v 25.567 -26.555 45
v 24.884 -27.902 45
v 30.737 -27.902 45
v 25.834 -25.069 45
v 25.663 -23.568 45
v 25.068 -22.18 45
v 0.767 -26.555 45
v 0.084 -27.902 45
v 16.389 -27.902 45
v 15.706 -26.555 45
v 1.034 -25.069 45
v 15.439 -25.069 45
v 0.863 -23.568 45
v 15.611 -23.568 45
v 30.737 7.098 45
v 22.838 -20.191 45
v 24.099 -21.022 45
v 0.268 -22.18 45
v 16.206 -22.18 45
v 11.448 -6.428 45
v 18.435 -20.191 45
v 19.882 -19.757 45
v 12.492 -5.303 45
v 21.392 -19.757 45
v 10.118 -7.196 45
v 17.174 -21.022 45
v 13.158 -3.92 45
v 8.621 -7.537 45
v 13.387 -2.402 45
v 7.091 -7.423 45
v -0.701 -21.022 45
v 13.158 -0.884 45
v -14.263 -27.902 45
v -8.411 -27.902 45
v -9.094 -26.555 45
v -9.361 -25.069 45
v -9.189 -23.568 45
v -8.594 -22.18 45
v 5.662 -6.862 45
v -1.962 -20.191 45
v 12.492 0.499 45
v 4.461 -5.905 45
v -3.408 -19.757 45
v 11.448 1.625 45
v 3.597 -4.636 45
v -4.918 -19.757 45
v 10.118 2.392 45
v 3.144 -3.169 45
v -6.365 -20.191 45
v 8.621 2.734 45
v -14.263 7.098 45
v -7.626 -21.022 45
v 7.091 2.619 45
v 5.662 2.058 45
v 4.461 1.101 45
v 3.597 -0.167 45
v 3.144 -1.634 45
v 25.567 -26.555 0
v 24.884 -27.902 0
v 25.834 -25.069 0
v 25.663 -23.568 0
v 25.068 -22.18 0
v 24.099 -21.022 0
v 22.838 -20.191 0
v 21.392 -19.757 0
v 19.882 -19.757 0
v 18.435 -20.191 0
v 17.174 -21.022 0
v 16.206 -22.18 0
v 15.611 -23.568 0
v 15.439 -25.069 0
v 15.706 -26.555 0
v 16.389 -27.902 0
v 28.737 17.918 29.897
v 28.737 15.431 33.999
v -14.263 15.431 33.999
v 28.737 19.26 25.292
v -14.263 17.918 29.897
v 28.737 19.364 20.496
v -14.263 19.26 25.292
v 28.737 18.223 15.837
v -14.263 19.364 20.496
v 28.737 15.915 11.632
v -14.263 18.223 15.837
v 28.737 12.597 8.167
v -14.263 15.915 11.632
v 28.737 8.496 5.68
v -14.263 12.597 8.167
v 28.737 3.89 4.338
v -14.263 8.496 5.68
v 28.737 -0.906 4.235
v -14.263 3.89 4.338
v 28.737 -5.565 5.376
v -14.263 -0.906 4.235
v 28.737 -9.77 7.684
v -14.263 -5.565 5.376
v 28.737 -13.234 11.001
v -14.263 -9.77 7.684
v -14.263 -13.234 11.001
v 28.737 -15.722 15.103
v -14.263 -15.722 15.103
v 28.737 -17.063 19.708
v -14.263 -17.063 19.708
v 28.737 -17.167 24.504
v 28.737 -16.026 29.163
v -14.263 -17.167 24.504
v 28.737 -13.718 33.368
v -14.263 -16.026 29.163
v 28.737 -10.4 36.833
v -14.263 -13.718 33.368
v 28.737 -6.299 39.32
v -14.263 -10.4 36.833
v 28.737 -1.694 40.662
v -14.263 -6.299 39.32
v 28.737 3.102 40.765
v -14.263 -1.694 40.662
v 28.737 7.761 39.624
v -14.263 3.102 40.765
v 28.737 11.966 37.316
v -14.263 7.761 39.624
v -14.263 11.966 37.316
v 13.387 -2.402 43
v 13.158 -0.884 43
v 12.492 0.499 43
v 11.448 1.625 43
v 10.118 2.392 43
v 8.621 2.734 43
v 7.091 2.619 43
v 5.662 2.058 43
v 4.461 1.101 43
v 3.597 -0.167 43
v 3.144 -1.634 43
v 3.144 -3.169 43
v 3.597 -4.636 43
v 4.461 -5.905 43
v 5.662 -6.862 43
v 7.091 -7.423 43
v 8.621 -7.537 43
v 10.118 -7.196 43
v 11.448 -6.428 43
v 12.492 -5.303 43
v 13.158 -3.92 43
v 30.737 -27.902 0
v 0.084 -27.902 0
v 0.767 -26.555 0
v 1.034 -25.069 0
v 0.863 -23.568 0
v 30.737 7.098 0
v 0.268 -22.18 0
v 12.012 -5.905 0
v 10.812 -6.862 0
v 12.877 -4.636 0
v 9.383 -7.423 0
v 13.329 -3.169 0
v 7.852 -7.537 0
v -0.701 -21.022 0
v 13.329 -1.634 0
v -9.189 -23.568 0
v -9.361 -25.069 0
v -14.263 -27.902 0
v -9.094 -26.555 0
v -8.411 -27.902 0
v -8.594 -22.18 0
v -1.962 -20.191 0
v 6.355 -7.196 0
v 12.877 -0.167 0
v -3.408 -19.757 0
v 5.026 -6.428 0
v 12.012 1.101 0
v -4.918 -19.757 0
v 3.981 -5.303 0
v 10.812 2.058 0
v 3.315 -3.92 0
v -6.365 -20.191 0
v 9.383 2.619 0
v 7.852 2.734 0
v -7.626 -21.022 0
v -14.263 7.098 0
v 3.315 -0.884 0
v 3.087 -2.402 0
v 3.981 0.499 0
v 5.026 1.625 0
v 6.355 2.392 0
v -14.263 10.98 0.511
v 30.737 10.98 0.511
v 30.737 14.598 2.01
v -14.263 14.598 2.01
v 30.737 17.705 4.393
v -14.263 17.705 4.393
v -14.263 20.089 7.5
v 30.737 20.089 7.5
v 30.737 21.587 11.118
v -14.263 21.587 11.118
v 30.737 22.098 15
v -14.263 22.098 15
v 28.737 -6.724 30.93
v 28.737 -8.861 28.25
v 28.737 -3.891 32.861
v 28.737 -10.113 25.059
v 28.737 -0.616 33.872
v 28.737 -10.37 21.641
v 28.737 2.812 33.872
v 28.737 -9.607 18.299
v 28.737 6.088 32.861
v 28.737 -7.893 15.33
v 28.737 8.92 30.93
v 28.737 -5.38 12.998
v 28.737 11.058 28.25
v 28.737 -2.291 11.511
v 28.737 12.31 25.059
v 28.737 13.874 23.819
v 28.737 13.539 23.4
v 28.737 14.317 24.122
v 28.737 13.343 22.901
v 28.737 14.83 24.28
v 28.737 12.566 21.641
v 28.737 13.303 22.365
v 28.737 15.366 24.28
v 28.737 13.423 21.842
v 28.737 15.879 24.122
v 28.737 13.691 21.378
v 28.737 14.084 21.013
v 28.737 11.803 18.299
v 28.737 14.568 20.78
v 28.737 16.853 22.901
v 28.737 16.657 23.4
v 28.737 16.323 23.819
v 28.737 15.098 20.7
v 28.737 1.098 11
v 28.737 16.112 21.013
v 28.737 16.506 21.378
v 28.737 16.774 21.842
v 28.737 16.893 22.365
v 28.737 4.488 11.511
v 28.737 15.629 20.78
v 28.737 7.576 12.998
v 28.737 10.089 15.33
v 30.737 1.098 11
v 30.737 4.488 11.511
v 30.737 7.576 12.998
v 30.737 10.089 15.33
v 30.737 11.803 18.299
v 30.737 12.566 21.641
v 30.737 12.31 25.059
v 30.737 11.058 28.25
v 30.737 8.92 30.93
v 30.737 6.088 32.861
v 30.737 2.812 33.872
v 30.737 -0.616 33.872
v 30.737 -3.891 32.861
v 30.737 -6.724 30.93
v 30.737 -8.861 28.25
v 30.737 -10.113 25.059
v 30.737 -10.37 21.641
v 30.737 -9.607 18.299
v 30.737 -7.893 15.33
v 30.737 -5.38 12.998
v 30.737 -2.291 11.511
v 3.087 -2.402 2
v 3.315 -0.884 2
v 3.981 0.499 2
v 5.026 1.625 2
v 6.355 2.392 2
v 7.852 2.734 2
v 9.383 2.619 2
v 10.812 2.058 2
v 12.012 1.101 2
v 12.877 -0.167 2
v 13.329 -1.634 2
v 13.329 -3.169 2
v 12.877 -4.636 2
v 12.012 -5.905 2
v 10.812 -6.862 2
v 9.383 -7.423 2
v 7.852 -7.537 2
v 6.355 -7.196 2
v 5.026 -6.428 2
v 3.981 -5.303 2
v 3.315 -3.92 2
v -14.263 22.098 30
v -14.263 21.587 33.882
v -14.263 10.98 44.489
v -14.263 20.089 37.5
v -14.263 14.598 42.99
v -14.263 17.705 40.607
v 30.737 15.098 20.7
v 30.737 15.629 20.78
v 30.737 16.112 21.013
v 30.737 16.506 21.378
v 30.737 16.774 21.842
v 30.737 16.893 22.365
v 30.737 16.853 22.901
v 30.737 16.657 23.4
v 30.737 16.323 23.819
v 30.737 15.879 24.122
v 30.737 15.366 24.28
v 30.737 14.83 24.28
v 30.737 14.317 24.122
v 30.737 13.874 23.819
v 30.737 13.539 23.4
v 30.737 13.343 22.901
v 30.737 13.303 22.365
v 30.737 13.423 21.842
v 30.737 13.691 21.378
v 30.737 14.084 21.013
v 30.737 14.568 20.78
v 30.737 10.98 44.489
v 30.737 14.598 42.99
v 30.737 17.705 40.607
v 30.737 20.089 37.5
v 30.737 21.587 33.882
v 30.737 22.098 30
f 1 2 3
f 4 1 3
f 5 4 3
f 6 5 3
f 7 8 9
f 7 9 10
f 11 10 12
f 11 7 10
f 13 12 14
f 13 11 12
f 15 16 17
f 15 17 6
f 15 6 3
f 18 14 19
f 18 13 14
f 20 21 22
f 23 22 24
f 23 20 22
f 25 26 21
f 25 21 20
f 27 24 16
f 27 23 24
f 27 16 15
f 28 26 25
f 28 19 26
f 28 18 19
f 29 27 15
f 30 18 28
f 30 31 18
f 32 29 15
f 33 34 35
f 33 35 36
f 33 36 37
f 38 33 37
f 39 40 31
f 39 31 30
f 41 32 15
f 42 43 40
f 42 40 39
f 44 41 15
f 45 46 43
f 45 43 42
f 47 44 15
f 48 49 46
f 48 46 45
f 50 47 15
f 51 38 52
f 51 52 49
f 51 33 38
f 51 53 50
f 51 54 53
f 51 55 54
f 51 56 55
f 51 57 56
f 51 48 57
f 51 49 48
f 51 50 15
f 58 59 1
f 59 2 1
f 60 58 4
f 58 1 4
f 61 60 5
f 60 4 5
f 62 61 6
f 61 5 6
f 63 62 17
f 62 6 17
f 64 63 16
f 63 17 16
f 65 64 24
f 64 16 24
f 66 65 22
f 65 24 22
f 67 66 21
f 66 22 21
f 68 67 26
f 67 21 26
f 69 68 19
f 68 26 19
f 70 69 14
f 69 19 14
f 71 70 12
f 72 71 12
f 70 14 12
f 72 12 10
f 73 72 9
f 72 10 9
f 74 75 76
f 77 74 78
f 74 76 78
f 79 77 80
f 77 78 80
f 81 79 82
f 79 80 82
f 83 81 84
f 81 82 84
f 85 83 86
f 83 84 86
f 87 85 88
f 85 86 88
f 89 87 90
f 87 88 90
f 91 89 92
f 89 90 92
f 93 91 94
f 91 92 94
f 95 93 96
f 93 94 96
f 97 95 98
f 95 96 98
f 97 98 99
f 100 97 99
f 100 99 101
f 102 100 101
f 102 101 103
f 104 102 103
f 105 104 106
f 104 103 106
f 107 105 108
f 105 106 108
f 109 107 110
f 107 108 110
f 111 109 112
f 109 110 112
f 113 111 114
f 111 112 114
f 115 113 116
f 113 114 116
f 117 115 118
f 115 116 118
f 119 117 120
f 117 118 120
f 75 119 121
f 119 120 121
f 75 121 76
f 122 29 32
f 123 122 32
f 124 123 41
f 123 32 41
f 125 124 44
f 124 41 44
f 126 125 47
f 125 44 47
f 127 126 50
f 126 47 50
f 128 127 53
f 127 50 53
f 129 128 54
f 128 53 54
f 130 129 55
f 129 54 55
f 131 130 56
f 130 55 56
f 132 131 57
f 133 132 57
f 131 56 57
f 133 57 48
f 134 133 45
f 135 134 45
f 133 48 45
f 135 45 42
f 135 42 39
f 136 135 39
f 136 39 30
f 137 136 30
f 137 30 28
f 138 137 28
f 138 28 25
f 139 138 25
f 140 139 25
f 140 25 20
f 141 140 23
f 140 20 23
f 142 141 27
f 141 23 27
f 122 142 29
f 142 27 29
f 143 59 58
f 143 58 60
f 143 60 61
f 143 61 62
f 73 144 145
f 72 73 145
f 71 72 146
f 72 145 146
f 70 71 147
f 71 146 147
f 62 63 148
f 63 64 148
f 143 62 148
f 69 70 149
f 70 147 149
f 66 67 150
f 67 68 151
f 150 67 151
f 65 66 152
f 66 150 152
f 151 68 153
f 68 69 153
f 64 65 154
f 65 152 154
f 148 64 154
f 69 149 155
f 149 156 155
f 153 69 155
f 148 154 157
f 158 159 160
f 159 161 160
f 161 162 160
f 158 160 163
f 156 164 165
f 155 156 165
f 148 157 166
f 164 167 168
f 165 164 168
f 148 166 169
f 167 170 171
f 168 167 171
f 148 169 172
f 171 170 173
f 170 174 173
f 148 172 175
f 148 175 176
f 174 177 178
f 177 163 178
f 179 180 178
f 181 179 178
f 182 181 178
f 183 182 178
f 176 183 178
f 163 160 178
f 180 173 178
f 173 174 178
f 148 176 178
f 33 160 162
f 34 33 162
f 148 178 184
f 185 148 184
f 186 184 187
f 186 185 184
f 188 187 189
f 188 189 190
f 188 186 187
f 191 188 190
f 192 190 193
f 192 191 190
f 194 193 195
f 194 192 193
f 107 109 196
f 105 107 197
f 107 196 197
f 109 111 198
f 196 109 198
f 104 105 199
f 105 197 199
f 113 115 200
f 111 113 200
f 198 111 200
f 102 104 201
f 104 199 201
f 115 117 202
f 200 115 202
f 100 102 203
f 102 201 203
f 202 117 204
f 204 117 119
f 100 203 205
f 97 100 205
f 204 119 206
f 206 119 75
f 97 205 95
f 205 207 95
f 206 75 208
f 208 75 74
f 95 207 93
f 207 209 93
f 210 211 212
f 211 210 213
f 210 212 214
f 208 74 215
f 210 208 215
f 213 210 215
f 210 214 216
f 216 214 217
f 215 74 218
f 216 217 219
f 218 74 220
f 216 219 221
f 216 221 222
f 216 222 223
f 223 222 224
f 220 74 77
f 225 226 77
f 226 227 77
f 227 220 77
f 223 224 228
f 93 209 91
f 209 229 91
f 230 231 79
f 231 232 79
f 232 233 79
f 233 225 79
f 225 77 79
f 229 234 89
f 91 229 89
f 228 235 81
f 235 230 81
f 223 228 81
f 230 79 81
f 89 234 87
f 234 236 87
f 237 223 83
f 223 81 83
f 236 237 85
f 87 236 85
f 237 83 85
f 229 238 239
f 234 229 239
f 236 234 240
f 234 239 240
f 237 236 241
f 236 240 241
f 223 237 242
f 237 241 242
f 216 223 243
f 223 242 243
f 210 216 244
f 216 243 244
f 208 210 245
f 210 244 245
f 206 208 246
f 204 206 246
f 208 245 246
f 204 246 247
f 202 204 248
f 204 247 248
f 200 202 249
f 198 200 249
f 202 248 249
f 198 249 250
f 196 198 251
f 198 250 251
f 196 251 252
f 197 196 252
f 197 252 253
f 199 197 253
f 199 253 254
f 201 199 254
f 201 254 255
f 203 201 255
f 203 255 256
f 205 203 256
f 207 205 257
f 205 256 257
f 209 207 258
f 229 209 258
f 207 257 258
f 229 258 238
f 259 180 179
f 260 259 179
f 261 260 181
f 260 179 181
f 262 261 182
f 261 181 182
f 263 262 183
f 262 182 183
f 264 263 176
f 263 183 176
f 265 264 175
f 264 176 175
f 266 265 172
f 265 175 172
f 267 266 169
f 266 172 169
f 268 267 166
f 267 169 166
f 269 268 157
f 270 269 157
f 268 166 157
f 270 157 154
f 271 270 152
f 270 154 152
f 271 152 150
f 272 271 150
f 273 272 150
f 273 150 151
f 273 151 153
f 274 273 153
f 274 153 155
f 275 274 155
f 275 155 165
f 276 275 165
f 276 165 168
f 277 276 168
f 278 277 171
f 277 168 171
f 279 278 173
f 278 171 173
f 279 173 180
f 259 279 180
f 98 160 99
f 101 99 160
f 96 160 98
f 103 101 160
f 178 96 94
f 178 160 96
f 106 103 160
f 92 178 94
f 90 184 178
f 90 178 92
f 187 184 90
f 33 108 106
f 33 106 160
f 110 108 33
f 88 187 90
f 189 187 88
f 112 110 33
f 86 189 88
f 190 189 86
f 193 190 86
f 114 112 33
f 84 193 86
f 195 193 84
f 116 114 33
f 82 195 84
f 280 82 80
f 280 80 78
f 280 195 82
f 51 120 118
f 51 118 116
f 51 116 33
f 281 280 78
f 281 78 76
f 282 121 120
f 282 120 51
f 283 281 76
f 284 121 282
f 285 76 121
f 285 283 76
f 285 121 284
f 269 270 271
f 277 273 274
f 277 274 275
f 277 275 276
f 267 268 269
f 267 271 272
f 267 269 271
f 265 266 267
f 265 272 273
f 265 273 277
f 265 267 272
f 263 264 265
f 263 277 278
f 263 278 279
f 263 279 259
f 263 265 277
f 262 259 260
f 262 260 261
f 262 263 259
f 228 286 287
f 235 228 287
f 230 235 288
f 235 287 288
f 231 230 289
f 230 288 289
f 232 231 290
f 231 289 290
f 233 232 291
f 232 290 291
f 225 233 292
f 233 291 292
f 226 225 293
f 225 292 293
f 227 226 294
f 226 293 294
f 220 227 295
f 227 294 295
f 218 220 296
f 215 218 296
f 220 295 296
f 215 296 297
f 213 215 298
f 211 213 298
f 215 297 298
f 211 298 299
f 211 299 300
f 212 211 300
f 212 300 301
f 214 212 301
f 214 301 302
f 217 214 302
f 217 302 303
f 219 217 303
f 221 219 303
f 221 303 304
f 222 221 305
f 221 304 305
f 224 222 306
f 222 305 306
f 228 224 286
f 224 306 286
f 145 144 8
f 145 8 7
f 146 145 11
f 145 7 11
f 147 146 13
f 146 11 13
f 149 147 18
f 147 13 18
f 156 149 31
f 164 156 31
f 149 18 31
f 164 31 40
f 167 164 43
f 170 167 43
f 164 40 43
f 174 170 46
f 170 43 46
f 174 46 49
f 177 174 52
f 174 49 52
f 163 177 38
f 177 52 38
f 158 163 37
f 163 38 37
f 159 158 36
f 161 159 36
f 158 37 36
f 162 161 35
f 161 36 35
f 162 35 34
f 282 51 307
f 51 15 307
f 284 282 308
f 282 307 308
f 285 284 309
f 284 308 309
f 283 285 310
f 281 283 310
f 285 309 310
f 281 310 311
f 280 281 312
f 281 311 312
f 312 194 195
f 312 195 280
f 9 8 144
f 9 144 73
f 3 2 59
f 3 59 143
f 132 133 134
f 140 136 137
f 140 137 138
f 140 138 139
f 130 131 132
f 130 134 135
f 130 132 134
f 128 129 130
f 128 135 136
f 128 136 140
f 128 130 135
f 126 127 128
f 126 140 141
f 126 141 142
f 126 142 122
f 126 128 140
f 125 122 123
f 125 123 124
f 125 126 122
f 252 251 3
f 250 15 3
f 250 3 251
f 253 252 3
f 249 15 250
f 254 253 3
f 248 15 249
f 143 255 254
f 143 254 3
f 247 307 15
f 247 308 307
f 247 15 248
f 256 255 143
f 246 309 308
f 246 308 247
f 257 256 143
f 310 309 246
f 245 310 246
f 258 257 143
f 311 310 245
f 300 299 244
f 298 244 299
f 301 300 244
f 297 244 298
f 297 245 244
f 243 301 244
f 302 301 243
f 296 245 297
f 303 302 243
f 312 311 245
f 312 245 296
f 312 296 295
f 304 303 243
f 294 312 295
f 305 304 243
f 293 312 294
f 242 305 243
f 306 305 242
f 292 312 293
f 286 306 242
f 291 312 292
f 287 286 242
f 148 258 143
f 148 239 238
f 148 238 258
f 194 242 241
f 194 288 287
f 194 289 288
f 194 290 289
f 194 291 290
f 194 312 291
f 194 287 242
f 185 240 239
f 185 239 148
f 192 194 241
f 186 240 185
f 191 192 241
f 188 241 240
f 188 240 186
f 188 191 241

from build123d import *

# Parameters (mm, degrees)
SKETCH1_W           = 45
SKETCH1_H           = 50
BOSS_EXTRUDE1_DEPTH = 45
SKETCH2_R           = 5.2
CUT_EXTRUDE1_DEPTH  = 45
SKETCH9_R           = 5.15
CUT_EXTRUDE6_DEPTH  = 2
SKETCH10_R          = 5.15
CUT_EXTRUDE7_DEPTH  = 2
SKETCH12_R          = 18.375
CUT_EXTRUDE8_DEPTH  = 45
SKETCH13_W          = 45
SKETCH13_H          = 6.66747138
CUT_EXTRUDE9_DEPTH  = 46
SKETCH14_W          = 45
SKETCH14_H          = 6.66747138
BOSS_EXTRUDE2_DEPTH = 45
SKETCH15_R          = 18.375
CUT_EXTRUDE10_DEPTH = 45
FILLET1_R           = 15
SKETCH16_R          = 18.375
BOSS_EXTRUDE3_DEPTH = 2
SKETCH17_R          = 11.5
CUT_EXTRUDE11_DEPTH = 2
SKETCH18_R          = 1.8
CUT_EXTRUDE12_DEPTH = 2


with BuildPart() as part:
    # Sketch1 → Boss-Extrude1 (new body)
    with BuildSketch(Plane.XY):
        with Locations((8.236607143, -2.901785714)):
            Rectangle(SKETCH1_W, SKETCH1_H)
    extrude(amount=BOSS_EXTRUDE1_DEPTH)

    # Sketch2 → Cut-Extrude1 (cut)
    with BuildSketch(Plane.XY.offset(45)):
        with Locations((-4.163392857, -24.901785714)):
            Circle(SKETCH2_R)
        with Locations((20.636607143, -24.901785714)):
            Circle(SKETCH2_R)
    extrude(amount=-CUT_EXTRUDE1_DEPTH, mode=Mode.SUBTRACT)

    # Sketch9 → Cut-Extrude6 (cut)
    with BuildSketch(Plane.XY.offset(45)):
        with Locations((8.236607143, -2.401785714)):
            Circle(SKETCH9_R)
    extrude(amount=-CUT_EXTRUDE6_DEPTH, mode=Mode.SUBTRACT)

    # Sketch10 → Cut-Extrude7 (cut)
    with BuildSketch(Plane(origin=(0, 0, 0), x_dir=(-1, 0, 0), z_dir=(0, 0, -1))):
        with Locations((-8.236607143, -2.401785714)):
            Circle(SKETCH10_R)
    extrude(amount=-CUT_EXTRUDE7_DEPTH, mode=Mode.SUBTRACT)

    # Sketch12 → Cut-Extrude8 (cut)
    with BuildSketch(Plane.ZY.offset(14.263392857)):
        with Locations((22.5, 1.098214286)):
            Circle(SKETCH12_R)
    extrude(amount=-CUT_EXTRUDE8_DEPTH, mode=Mode.SUBTRACT)

    # Sketch13 → Cut-Extrude9 (cut)
    with BuildSketch(Plane.ZY.offset(14.263392857)):
        with Locations((22.5, 18.764478596)):
            Rectangle(SKETCH13_W, SKETCH13_H)
    extrude(amount=-CUT_EXTRUDE9_DEPTH, mode=Mode.SUBTRACT)

    # Sketch14 → Boss-Extrude2 (add)
    with BuildSketch(Plane.ZY.offset(14.263392857)):
        with Locations((22.5, 18.764478596)):
            Rectangle(SKETCH14_W, SKETCH14_H)
    extrude(amount=-BOSS_EXTRUDE2_DEPTH)

    # Sketch15 → Cut-Extrude10 (cut)
    with BuildSketch(Plane.ZY.offset(14.263392857)):
        with Locations((22.5, 1.098214286)):
            Circle(SKETCH15_R)
    extrude(amount=-CUT_EXTRUDE10_DEPTH, mode=Mode.SUBTRACT)

    # Fillet1
    fillet1_edges = [part.edges().sort_by_distance(p)[0] for p in [
        (8.236607143, 22.098214286, 0),
        (8.236607143, 22.098214286, 45),
    ]]
    fillet(fillet1_edges, radius=FILLET1_R)

    # Sketch16 → Boss-Extrude3 (add)
    with BuildSketch(Plane(origin=(30.736607143, 0, 0), x_dir=(0, 0, -1), z_dir=(1, 0, 0))):
        with Locations((-22.5, 1.098214286)):
            Circle(SKETCH16_R)
    extrude(amount=-BOSS_EXTRUDE3_DEPTH)

    # Sketch17 → Cut-Extrude11 (cut)
    with BuildSketch(Plane(origin=(30.736607143, 0, 0), x_dir=(0, 0, -1), z_dir=(1, 0, 0))):
        with Locations((-22.5, 1.098214286)):
            Circle(SKETCH17_R)
    extrude(amount=-CUT_EXTRUDE11_DEPTH, mode=Mode.SUBTRACT)

    # Sketch18 → Cut-Extrude12 (cut)
    with BuildSketch(Plane(origin=(30.736607143, 0, 0), x_dir=(0, 0, -1), z_dir=(1, 0, 0))):
        with Locations((-22.5, 15.098214286)):
            Circle(SKETCH18_R)
    extrude(amount=-CUT_EXTRUDE12_DEPTH, mode=Mode.SUBTRACT)


solid = part.part
